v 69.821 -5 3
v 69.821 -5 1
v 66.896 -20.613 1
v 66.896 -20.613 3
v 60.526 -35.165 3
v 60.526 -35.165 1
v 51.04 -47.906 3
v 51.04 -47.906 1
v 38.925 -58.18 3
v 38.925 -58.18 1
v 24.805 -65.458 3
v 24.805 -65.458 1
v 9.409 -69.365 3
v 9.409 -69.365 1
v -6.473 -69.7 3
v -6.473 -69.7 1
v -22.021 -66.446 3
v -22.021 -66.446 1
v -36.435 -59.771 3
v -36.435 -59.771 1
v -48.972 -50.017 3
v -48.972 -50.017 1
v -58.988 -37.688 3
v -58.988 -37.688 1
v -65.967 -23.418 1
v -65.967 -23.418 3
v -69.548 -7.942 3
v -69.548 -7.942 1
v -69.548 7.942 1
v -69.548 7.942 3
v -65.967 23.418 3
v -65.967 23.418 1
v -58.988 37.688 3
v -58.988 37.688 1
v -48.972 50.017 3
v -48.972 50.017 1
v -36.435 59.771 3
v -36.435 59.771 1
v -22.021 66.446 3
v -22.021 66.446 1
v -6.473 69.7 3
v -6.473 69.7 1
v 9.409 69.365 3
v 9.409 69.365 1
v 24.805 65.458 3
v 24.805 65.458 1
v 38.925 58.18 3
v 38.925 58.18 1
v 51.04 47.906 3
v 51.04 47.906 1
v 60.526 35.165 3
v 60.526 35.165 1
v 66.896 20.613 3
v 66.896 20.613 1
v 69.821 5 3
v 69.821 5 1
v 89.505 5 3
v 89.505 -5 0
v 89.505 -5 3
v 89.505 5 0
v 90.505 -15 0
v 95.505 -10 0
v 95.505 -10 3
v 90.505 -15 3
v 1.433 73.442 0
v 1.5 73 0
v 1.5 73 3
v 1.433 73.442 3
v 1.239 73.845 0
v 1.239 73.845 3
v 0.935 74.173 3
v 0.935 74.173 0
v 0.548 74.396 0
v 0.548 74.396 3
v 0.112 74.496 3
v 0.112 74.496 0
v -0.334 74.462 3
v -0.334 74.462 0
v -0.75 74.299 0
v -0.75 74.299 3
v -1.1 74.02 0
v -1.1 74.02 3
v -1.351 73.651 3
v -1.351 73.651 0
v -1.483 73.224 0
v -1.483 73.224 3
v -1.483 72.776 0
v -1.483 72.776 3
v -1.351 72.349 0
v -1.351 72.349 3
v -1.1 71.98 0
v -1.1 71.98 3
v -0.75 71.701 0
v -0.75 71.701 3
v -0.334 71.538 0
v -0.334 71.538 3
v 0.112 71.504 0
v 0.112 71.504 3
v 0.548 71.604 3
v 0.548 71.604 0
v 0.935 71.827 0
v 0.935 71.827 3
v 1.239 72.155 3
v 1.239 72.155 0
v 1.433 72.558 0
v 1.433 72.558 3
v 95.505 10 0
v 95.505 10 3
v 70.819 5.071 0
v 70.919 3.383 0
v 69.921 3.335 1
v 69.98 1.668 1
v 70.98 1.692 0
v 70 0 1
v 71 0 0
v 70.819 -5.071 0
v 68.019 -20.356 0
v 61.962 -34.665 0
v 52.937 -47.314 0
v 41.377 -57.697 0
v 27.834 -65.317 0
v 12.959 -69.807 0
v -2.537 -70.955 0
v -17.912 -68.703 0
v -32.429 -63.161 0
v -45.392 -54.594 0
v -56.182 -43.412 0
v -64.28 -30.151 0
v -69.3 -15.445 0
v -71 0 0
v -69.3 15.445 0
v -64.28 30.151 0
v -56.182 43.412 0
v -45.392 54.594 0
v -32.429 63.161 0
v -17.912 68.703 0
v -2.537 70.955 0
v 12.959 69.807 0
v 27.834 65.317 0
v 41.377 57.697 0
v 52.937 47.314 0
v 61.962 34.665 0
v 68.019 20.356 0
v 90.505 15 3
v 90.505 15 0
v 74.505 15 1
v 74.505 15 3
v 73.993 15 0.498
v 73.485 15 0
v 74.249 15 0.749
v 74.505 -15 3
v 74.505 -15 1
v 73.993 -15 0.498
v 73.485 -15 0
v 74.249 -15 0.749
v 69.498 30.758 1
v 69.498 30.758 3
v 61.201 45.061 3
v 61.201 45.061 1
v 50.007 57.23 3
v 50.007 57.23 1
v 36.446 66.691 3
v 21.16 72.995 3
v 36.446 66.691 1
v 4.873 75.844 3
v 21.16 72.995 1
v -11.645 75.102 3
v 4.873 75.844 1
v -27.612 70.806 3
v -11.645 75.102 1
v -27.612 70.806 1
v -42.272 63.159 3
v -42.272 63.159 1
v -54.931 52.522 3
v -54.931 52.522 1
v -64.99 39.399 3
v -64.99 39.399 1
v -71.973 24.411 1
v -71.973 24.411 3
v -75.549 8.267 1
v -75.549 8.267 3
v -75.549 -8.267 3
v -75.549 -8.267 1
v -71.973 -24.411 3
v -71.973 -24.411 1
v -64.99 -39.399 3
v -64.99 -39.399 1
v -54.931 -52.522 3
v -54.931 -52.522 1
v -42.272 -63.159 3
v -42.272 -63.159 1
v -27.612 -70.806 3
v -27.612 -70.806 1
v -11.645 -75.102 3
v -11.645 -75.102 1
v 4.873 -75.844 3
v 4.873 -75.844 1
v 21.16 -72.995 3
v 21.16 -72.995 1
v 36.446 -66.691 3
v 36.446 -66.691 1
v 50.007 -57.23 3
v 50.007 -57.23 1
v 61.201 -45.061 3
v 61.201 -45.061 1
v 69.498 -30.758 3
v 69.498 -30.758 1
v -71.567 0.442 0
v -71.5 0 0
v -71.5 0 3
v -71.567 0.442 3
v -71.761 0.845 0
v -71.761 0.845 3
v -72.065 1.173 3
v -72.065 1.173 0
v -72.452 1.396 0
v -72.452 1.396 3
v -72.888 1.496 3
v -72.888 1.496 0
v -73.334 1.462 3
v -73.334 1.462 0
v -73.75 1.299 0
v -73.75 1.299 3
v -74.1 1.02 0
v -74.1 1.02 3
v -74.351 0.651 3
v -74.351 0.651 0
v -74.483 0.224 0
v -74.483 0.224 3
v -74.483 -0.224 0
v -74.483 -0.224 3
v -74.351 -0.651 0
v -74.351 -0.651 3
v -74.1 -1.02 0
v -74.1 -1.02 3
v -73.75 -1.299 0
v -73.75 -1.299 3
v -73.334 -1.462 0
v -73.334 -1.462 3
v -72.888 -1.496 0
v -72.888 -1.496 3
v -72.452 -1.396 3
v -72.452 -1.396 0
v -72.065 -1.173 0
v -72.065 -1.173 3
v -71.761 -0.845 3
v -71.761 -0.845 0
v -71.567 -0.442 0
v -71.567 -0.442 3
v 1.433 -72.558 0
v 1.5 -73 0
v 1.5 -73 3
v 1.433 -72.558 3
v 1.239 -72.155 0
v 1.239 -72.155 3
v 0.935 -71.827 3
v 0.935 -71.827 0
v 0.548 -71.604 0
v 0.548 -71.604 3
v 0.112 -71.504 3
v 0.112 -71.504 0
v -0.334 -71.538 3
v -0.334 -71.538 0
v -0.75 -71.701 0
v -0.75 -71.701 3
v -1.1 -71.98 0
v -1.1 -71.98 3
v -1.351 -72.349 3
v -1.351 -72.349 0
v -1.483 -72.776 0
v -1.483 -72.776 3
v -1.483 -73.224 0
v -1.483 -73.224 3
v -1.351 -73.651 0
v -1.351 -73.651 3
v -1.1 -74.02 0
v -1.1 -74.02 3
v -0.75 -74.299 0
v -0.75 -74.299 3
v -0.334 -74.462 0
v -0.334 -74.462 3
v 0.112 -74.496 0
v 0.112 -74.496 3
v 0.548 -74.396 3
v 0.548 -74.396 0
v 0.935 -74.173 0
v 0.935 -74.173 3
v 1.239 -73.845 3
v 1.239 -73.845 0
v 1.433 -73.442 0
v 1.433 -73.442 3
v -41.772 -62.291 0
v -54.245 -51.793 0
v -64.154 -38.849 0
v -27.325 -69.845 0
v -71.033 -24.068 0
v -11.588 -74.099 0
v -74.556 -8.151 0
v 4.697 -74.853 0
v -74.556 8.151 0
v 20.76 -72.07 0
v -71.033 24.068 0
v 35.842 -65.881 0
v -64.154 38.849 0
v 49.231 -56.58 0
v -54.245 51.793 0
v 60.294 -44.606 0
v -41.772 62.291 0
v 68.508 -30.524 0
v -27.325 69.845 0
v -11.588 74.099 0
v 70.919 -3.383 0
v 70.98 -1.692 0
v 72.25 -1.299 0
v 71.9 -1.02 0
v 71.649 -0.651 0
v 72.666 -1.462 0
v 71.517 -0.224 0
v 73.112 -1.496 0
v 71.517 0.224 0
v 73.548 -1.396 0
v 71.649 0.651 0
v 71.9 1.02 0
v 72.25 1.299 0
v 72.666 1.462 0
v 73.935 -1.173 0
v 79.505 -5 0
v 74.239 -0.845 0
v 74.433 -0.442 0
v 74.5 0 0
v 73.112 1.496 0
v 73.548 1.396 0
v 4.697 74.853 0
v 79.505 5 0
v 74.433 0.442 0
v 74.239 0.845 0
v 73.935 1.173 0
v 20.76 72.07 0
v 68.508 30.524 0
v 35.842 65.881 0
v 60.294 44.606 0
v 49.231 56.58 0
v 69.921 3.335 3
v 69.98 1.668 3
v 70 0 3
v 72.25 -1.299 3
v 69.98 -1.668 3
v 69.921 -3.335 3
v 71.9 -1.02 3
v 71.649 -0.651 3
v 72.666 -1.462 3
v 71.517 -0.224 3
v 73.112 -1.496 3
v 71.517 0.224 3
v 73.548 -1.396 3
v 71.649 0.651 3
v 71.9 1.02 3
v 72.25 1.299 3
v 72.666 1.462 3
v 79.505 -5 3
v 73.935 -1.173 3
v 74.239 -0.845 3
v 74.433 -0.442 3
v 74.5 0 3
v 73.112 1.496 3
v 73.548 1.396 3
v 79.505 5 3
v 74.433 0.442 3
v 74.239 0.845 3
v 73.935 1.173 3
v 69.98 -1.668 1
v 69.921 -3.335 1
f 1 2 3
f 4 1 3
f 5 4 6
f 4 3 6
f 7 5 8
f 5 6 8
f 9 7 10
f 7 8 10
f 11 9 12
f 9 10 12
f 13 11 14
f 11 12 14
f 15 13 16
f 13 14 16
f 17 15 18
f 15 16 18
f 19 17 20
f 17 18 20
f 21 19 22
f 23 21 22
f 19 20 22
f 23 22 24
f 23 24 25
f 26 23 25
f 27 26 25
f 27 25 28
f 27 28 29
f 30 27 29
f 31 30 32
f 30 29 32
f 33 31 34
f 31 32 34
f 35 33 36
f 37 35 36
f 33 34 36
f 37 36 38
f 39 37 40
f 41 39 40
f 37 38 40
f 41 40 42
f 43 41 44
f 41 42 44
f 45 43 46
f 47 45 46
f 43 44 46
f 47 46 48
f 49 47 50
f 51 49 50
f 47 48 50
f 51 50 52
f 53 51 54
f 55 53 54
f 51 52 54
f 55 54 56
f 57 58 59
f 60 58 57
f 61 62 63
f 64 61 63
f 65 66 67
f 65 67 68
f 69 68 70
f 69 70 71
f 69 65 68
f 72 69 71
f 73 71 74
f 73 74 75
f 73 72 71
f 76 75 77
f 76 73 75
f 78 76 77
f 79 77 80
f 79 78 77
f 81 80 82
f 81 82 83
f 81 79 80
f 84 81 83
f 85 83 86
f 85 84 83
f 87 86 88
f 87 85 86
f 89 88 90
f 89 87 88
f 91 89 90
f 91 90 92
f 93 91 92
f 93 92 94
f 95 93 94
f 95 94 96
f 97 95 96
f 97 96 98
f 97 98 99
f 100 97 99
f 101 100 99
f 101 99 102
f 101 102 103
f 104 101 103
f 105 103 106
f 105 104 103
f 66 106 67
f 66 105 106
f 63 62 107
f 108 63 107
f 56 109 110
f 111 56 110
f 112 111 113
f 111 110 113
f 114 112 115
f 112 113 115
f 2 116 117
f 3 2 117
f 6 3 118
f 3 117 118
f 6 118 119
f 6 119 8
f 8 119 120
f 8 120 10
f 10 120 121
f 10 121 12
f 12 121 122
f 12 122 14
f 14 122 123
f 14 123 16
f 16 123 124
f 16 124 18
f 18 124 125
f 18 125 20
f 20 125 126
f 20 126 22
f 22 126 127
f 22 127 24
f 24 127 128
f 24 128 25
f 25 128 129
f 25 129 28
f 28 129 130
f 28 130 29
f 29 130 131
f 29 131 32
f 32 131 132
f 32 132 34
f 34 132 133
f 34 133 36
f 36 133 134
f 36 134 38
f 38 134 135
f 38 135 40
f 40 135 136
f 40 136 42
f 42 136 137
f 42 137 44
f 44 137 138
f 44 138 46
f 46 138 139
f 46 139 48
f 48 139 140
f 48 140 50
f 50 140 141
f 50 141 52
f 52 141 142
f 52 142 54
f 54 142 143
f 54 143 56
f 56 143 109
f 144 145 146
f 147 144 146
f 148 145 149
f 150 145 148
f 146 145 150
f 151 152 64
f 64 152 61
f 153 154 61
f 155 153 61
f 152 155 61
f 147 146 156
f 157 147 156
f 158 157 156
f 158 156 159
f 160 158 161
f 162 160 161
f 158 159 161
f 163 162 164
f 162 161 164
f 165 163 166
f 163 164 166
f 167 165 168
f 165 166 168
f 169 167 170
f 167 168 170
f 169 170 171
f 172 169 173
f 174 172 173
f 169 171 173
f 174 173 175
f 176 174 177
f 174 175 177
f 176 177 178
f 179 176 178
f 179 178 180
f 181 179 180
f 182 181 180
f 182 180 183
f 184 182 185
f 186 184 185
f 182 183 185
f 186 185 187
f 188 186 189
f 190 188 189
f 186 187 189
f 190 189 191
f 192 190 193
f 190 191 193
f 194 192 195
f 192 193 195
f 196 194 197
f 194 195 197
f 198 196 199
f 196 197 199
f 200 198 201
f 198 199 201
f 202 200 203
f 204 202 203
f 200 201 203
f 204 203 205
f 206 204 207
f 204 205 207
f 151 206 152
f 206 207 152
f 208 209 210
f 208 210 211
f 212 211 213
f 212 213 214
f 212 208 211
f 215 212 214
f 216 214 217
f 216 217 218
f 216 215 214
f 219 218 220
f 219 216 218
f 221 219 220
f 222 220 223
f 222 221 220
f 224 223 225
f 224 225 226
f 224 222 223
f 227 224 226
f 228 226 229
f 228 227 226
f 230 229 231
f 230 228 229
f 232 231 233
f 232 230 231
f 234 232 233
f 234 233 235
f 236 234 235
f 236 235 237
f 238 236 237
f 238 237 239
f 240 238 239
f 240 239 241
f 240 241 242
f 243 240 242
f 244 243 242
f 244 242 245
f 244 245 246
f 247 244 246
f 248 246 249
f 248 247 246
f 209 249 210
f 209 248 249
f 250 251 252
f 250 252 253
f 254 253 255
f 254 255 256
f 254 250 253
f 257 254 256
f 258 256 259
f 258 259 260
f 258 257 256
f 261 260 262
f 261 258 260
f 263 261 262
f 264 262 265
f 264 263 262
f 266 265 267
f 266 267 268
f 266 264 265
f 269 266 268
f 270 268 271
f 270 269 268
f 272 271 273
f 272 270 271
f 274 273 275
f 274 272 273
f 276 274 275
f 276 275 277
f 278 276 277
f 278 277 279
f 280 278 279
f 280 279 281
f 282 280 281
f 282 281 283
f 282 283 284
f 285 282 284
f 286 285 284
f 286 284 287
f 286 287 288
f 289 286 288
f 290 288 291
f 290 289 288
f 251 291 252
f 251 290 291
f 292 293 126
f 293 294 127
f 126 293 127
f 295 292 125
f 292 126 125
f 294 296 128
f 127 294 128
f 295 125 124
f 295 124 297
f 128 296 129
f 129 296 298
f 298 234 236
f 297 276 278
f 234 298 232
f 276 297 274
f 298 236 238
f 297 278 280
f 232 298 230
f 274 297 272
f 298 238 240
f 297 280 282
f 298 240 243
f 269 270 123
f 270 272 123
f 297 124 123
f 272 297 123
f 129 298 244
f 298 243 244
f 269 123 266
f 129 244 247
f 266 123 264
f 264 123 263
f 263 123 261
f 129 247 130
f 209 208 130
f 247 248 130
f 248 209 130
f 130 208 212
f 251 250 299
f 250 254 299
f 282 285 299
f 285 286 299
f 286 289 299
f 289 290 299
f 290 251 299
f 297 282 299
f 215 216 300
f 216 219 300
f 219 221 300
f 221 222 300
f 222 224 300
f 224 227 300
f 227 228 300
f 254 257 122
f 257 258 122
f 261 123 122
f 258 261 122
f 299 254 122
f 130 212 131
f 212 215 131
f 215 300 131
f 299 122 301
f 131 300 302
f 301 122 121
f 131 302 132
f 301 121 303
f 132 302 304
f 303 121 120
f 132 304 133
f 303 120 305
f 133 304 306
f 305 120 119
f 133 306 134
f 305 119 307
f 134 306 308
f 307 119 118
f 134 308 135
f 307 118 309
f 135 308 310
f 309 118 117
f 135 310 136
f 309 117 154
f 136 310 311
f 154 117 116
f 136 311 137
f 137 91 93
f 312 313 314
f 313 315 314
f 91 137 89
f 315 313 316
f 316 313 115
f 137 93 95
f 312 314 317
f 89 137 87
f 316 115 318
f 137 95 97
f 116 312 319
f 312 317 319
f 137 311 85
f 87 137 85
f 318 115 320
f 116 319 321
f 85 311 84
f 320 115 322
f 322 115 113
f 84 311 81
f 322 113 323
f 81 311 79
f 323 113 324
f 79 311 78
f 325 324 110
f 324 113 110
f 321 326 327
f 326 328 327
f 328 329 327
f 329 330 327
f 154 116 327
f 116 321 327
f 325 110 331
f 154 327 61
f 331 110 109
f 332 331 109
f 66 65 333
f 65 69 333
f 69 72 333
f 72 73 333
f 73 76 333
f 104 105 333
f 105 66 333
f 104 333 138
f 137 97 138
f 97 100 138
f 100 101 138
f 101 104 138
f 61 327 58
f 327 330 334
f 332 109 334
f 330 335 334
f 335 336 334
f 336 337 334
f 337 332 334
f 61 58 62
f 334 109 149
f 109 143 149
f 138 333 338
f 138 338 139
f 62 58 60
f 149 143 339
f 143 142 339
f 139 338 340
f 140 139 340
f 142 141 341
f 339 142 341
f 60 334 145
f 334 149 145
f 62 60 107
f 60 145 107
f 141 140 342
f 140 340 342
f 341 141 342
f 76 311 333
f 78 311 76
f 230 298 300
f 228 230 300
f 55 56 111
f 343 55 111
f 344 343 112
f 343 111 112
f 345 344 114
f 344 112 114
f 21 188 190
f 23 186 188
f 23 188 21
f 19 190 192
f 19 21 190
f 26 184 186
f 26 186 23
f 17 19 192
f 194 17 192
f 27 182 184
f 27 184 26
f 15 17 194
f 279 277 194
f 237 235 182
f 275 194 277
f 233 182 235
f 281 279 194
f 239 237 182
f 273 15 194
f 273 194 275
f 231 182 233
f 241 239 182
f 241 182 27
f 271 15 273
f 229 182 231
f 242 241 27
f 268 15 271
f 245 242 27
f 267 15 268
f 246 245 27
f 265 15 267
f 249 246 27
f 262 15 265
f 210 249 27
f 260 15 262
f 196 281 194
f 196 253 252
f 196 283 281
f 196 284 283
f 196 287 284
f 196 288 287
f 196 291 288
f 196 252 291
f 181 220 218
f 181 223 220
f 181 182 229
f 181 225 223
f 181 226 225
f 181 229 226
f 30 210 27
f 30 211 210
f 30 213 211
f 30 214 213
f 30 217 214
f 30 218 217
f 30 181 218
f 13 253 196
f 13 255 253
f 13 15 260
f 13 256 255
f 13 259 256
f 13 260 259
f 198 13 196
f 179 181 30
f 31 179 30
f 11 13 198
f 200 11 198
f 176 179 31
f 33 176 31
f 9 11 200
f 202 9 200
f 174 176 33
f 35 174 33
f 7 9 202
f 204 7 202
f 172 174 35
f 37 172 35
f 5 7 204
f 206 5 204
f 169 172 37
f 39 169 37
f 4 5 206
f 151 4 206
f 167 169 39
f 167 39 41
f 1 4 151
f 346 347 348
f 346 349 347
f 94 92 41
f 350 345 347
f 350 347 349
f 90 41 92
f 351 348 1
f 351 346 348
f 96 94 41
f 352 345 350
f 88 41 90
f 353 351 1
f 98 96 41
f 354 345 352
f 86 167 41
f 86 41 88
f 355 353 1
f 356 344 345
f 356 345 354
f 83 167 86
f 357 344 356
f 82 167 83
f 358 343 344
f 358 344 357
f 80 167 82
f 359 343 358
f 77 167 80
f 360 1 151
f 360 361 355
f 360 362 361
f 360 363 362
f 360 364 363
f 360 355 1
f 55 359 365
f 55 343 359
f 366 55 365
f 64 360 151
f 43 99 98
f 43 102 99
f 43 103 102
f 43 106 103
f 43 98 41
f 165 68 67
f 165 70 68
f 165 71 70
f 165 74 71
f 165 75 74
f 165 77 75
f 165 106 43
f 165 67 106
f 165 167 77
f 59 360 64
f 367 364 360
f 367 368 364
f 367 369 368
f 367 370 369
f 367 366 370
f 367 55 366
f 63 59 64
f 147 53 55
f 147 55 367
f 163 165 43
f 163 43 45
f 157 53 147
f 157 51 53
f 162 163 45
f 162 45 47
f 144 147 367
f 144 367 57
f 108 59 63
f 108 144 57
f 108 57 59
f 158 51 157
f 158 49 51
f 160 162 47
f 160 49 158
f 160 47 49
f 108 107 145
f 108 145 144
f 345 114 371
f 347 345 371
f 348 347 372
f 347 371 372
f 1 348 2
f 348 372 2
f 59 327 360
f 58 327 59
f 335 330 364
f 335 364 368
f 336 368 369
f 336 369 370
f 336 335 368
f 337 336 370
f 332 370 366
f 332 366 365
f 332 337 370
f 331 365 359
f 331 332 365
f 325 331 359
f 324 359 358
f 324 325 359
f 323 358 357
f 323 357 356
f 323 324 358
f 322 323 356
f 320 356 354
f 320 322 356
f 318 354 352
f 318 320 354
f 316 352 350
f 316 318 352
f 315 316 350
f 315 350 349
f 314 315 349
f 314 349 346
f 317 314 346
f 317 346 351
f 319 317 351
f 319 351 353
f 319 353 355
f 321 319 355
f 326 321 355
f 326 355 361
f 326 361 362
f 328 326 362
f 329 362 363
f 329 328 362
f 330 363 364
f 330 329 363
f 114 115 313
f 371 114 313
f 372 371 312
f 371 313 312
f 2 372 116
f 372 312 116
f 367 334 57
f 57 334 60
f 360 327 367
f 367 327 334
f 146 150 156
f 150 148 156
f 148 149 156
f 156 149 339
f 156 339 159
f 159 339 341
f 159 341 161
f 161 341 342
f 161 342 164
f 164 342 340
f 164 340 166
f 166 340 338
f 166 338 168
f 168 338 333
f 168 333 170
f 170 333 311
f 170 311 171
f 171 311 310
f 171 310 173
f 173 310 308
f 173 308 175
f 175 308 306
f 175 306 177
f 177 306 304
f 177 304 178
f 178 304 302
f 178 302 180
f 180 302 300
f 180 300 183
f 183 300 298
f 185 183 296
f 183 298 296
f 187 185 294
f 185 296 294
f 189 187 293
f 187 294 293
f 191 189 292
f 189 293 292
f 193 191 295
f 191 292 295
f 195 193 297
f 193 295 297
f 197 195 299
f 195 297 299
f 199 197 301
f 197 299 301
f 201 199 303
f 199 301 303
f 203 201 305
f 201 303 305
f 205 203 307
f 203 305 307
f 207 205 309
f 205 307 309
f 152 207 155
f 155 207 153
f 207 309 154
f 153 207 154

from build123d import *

# Parameters (mm, degrees)
F0_R     = 1.5
F0_W     = 10
F0_H     = 10
F1_DEPTH = 3
F2_SIZE  = 1
F3_SIZE  = 5


with BuildPart() as f1:
    # F0 (on Top) → F1 (new body)
    with BuildSketch(Plane.XY):
        with BuildLine():
            Line((95.505033, 15), (74.505033, 15))
            ThreePointArc((74.505033, 15), (-76, 0), (74.505033, -15))
            Line((74.505033, -15), (95.505033, -15))
            Line((95.505033, -15), (95.505033, 0))
            Line((95.505033, 0), (95.505033, 15))
        make_face()
        with Locations((0, -73)):
            Circle(F0_R, mode=Mode.SUBTRACT)
        with Locations((-73, 0)):
            Circle(F0_R, mode=Mode.SUBTRACT)
        with BuildLine():
            ThreePointArc((69.8212, 5), (69.955286, 2.501598), (70, 0))
            ThreePointArc((70, 0), (69.955286, -2.501598), (69.8212, -5))
            ThreePointArc((69.8212, -5), (-70, 0), (69.8212, 5))
        make_face(mode=Mode.SUBTRACT)
        with Locations((0, 73)):
            Circle(F0_R, mode=Mode.SUBTRACT)
        with Locations((73, 0)):
            Circle(F0_R, mode=Mode.SUBTRACT)
        with Locations((84.505033, 0)):
            Rectangle(F0_W, F0_H, mode=Mode.SUBTRACT)
    extrude(amount=F1_DEPTH)

    # F2
    f2_edges = [f1.edges().sort_by_distance(p)[0] for p in [
        (-76, 0, 0),
        (-69.8212, -5, 0),
    ]]
    chamfer(f2_edges, length=F2_SIZE)

    # F3
    f3_edges = [f1.edges().sort_by_distance(p)[0] for p in [
        (95.505033, -15, 1.5),
        (95.505033, 15, 1.5),
    ]]
    chamfer(f3_edges, length=F3_SIZE)


solid = f1.part
